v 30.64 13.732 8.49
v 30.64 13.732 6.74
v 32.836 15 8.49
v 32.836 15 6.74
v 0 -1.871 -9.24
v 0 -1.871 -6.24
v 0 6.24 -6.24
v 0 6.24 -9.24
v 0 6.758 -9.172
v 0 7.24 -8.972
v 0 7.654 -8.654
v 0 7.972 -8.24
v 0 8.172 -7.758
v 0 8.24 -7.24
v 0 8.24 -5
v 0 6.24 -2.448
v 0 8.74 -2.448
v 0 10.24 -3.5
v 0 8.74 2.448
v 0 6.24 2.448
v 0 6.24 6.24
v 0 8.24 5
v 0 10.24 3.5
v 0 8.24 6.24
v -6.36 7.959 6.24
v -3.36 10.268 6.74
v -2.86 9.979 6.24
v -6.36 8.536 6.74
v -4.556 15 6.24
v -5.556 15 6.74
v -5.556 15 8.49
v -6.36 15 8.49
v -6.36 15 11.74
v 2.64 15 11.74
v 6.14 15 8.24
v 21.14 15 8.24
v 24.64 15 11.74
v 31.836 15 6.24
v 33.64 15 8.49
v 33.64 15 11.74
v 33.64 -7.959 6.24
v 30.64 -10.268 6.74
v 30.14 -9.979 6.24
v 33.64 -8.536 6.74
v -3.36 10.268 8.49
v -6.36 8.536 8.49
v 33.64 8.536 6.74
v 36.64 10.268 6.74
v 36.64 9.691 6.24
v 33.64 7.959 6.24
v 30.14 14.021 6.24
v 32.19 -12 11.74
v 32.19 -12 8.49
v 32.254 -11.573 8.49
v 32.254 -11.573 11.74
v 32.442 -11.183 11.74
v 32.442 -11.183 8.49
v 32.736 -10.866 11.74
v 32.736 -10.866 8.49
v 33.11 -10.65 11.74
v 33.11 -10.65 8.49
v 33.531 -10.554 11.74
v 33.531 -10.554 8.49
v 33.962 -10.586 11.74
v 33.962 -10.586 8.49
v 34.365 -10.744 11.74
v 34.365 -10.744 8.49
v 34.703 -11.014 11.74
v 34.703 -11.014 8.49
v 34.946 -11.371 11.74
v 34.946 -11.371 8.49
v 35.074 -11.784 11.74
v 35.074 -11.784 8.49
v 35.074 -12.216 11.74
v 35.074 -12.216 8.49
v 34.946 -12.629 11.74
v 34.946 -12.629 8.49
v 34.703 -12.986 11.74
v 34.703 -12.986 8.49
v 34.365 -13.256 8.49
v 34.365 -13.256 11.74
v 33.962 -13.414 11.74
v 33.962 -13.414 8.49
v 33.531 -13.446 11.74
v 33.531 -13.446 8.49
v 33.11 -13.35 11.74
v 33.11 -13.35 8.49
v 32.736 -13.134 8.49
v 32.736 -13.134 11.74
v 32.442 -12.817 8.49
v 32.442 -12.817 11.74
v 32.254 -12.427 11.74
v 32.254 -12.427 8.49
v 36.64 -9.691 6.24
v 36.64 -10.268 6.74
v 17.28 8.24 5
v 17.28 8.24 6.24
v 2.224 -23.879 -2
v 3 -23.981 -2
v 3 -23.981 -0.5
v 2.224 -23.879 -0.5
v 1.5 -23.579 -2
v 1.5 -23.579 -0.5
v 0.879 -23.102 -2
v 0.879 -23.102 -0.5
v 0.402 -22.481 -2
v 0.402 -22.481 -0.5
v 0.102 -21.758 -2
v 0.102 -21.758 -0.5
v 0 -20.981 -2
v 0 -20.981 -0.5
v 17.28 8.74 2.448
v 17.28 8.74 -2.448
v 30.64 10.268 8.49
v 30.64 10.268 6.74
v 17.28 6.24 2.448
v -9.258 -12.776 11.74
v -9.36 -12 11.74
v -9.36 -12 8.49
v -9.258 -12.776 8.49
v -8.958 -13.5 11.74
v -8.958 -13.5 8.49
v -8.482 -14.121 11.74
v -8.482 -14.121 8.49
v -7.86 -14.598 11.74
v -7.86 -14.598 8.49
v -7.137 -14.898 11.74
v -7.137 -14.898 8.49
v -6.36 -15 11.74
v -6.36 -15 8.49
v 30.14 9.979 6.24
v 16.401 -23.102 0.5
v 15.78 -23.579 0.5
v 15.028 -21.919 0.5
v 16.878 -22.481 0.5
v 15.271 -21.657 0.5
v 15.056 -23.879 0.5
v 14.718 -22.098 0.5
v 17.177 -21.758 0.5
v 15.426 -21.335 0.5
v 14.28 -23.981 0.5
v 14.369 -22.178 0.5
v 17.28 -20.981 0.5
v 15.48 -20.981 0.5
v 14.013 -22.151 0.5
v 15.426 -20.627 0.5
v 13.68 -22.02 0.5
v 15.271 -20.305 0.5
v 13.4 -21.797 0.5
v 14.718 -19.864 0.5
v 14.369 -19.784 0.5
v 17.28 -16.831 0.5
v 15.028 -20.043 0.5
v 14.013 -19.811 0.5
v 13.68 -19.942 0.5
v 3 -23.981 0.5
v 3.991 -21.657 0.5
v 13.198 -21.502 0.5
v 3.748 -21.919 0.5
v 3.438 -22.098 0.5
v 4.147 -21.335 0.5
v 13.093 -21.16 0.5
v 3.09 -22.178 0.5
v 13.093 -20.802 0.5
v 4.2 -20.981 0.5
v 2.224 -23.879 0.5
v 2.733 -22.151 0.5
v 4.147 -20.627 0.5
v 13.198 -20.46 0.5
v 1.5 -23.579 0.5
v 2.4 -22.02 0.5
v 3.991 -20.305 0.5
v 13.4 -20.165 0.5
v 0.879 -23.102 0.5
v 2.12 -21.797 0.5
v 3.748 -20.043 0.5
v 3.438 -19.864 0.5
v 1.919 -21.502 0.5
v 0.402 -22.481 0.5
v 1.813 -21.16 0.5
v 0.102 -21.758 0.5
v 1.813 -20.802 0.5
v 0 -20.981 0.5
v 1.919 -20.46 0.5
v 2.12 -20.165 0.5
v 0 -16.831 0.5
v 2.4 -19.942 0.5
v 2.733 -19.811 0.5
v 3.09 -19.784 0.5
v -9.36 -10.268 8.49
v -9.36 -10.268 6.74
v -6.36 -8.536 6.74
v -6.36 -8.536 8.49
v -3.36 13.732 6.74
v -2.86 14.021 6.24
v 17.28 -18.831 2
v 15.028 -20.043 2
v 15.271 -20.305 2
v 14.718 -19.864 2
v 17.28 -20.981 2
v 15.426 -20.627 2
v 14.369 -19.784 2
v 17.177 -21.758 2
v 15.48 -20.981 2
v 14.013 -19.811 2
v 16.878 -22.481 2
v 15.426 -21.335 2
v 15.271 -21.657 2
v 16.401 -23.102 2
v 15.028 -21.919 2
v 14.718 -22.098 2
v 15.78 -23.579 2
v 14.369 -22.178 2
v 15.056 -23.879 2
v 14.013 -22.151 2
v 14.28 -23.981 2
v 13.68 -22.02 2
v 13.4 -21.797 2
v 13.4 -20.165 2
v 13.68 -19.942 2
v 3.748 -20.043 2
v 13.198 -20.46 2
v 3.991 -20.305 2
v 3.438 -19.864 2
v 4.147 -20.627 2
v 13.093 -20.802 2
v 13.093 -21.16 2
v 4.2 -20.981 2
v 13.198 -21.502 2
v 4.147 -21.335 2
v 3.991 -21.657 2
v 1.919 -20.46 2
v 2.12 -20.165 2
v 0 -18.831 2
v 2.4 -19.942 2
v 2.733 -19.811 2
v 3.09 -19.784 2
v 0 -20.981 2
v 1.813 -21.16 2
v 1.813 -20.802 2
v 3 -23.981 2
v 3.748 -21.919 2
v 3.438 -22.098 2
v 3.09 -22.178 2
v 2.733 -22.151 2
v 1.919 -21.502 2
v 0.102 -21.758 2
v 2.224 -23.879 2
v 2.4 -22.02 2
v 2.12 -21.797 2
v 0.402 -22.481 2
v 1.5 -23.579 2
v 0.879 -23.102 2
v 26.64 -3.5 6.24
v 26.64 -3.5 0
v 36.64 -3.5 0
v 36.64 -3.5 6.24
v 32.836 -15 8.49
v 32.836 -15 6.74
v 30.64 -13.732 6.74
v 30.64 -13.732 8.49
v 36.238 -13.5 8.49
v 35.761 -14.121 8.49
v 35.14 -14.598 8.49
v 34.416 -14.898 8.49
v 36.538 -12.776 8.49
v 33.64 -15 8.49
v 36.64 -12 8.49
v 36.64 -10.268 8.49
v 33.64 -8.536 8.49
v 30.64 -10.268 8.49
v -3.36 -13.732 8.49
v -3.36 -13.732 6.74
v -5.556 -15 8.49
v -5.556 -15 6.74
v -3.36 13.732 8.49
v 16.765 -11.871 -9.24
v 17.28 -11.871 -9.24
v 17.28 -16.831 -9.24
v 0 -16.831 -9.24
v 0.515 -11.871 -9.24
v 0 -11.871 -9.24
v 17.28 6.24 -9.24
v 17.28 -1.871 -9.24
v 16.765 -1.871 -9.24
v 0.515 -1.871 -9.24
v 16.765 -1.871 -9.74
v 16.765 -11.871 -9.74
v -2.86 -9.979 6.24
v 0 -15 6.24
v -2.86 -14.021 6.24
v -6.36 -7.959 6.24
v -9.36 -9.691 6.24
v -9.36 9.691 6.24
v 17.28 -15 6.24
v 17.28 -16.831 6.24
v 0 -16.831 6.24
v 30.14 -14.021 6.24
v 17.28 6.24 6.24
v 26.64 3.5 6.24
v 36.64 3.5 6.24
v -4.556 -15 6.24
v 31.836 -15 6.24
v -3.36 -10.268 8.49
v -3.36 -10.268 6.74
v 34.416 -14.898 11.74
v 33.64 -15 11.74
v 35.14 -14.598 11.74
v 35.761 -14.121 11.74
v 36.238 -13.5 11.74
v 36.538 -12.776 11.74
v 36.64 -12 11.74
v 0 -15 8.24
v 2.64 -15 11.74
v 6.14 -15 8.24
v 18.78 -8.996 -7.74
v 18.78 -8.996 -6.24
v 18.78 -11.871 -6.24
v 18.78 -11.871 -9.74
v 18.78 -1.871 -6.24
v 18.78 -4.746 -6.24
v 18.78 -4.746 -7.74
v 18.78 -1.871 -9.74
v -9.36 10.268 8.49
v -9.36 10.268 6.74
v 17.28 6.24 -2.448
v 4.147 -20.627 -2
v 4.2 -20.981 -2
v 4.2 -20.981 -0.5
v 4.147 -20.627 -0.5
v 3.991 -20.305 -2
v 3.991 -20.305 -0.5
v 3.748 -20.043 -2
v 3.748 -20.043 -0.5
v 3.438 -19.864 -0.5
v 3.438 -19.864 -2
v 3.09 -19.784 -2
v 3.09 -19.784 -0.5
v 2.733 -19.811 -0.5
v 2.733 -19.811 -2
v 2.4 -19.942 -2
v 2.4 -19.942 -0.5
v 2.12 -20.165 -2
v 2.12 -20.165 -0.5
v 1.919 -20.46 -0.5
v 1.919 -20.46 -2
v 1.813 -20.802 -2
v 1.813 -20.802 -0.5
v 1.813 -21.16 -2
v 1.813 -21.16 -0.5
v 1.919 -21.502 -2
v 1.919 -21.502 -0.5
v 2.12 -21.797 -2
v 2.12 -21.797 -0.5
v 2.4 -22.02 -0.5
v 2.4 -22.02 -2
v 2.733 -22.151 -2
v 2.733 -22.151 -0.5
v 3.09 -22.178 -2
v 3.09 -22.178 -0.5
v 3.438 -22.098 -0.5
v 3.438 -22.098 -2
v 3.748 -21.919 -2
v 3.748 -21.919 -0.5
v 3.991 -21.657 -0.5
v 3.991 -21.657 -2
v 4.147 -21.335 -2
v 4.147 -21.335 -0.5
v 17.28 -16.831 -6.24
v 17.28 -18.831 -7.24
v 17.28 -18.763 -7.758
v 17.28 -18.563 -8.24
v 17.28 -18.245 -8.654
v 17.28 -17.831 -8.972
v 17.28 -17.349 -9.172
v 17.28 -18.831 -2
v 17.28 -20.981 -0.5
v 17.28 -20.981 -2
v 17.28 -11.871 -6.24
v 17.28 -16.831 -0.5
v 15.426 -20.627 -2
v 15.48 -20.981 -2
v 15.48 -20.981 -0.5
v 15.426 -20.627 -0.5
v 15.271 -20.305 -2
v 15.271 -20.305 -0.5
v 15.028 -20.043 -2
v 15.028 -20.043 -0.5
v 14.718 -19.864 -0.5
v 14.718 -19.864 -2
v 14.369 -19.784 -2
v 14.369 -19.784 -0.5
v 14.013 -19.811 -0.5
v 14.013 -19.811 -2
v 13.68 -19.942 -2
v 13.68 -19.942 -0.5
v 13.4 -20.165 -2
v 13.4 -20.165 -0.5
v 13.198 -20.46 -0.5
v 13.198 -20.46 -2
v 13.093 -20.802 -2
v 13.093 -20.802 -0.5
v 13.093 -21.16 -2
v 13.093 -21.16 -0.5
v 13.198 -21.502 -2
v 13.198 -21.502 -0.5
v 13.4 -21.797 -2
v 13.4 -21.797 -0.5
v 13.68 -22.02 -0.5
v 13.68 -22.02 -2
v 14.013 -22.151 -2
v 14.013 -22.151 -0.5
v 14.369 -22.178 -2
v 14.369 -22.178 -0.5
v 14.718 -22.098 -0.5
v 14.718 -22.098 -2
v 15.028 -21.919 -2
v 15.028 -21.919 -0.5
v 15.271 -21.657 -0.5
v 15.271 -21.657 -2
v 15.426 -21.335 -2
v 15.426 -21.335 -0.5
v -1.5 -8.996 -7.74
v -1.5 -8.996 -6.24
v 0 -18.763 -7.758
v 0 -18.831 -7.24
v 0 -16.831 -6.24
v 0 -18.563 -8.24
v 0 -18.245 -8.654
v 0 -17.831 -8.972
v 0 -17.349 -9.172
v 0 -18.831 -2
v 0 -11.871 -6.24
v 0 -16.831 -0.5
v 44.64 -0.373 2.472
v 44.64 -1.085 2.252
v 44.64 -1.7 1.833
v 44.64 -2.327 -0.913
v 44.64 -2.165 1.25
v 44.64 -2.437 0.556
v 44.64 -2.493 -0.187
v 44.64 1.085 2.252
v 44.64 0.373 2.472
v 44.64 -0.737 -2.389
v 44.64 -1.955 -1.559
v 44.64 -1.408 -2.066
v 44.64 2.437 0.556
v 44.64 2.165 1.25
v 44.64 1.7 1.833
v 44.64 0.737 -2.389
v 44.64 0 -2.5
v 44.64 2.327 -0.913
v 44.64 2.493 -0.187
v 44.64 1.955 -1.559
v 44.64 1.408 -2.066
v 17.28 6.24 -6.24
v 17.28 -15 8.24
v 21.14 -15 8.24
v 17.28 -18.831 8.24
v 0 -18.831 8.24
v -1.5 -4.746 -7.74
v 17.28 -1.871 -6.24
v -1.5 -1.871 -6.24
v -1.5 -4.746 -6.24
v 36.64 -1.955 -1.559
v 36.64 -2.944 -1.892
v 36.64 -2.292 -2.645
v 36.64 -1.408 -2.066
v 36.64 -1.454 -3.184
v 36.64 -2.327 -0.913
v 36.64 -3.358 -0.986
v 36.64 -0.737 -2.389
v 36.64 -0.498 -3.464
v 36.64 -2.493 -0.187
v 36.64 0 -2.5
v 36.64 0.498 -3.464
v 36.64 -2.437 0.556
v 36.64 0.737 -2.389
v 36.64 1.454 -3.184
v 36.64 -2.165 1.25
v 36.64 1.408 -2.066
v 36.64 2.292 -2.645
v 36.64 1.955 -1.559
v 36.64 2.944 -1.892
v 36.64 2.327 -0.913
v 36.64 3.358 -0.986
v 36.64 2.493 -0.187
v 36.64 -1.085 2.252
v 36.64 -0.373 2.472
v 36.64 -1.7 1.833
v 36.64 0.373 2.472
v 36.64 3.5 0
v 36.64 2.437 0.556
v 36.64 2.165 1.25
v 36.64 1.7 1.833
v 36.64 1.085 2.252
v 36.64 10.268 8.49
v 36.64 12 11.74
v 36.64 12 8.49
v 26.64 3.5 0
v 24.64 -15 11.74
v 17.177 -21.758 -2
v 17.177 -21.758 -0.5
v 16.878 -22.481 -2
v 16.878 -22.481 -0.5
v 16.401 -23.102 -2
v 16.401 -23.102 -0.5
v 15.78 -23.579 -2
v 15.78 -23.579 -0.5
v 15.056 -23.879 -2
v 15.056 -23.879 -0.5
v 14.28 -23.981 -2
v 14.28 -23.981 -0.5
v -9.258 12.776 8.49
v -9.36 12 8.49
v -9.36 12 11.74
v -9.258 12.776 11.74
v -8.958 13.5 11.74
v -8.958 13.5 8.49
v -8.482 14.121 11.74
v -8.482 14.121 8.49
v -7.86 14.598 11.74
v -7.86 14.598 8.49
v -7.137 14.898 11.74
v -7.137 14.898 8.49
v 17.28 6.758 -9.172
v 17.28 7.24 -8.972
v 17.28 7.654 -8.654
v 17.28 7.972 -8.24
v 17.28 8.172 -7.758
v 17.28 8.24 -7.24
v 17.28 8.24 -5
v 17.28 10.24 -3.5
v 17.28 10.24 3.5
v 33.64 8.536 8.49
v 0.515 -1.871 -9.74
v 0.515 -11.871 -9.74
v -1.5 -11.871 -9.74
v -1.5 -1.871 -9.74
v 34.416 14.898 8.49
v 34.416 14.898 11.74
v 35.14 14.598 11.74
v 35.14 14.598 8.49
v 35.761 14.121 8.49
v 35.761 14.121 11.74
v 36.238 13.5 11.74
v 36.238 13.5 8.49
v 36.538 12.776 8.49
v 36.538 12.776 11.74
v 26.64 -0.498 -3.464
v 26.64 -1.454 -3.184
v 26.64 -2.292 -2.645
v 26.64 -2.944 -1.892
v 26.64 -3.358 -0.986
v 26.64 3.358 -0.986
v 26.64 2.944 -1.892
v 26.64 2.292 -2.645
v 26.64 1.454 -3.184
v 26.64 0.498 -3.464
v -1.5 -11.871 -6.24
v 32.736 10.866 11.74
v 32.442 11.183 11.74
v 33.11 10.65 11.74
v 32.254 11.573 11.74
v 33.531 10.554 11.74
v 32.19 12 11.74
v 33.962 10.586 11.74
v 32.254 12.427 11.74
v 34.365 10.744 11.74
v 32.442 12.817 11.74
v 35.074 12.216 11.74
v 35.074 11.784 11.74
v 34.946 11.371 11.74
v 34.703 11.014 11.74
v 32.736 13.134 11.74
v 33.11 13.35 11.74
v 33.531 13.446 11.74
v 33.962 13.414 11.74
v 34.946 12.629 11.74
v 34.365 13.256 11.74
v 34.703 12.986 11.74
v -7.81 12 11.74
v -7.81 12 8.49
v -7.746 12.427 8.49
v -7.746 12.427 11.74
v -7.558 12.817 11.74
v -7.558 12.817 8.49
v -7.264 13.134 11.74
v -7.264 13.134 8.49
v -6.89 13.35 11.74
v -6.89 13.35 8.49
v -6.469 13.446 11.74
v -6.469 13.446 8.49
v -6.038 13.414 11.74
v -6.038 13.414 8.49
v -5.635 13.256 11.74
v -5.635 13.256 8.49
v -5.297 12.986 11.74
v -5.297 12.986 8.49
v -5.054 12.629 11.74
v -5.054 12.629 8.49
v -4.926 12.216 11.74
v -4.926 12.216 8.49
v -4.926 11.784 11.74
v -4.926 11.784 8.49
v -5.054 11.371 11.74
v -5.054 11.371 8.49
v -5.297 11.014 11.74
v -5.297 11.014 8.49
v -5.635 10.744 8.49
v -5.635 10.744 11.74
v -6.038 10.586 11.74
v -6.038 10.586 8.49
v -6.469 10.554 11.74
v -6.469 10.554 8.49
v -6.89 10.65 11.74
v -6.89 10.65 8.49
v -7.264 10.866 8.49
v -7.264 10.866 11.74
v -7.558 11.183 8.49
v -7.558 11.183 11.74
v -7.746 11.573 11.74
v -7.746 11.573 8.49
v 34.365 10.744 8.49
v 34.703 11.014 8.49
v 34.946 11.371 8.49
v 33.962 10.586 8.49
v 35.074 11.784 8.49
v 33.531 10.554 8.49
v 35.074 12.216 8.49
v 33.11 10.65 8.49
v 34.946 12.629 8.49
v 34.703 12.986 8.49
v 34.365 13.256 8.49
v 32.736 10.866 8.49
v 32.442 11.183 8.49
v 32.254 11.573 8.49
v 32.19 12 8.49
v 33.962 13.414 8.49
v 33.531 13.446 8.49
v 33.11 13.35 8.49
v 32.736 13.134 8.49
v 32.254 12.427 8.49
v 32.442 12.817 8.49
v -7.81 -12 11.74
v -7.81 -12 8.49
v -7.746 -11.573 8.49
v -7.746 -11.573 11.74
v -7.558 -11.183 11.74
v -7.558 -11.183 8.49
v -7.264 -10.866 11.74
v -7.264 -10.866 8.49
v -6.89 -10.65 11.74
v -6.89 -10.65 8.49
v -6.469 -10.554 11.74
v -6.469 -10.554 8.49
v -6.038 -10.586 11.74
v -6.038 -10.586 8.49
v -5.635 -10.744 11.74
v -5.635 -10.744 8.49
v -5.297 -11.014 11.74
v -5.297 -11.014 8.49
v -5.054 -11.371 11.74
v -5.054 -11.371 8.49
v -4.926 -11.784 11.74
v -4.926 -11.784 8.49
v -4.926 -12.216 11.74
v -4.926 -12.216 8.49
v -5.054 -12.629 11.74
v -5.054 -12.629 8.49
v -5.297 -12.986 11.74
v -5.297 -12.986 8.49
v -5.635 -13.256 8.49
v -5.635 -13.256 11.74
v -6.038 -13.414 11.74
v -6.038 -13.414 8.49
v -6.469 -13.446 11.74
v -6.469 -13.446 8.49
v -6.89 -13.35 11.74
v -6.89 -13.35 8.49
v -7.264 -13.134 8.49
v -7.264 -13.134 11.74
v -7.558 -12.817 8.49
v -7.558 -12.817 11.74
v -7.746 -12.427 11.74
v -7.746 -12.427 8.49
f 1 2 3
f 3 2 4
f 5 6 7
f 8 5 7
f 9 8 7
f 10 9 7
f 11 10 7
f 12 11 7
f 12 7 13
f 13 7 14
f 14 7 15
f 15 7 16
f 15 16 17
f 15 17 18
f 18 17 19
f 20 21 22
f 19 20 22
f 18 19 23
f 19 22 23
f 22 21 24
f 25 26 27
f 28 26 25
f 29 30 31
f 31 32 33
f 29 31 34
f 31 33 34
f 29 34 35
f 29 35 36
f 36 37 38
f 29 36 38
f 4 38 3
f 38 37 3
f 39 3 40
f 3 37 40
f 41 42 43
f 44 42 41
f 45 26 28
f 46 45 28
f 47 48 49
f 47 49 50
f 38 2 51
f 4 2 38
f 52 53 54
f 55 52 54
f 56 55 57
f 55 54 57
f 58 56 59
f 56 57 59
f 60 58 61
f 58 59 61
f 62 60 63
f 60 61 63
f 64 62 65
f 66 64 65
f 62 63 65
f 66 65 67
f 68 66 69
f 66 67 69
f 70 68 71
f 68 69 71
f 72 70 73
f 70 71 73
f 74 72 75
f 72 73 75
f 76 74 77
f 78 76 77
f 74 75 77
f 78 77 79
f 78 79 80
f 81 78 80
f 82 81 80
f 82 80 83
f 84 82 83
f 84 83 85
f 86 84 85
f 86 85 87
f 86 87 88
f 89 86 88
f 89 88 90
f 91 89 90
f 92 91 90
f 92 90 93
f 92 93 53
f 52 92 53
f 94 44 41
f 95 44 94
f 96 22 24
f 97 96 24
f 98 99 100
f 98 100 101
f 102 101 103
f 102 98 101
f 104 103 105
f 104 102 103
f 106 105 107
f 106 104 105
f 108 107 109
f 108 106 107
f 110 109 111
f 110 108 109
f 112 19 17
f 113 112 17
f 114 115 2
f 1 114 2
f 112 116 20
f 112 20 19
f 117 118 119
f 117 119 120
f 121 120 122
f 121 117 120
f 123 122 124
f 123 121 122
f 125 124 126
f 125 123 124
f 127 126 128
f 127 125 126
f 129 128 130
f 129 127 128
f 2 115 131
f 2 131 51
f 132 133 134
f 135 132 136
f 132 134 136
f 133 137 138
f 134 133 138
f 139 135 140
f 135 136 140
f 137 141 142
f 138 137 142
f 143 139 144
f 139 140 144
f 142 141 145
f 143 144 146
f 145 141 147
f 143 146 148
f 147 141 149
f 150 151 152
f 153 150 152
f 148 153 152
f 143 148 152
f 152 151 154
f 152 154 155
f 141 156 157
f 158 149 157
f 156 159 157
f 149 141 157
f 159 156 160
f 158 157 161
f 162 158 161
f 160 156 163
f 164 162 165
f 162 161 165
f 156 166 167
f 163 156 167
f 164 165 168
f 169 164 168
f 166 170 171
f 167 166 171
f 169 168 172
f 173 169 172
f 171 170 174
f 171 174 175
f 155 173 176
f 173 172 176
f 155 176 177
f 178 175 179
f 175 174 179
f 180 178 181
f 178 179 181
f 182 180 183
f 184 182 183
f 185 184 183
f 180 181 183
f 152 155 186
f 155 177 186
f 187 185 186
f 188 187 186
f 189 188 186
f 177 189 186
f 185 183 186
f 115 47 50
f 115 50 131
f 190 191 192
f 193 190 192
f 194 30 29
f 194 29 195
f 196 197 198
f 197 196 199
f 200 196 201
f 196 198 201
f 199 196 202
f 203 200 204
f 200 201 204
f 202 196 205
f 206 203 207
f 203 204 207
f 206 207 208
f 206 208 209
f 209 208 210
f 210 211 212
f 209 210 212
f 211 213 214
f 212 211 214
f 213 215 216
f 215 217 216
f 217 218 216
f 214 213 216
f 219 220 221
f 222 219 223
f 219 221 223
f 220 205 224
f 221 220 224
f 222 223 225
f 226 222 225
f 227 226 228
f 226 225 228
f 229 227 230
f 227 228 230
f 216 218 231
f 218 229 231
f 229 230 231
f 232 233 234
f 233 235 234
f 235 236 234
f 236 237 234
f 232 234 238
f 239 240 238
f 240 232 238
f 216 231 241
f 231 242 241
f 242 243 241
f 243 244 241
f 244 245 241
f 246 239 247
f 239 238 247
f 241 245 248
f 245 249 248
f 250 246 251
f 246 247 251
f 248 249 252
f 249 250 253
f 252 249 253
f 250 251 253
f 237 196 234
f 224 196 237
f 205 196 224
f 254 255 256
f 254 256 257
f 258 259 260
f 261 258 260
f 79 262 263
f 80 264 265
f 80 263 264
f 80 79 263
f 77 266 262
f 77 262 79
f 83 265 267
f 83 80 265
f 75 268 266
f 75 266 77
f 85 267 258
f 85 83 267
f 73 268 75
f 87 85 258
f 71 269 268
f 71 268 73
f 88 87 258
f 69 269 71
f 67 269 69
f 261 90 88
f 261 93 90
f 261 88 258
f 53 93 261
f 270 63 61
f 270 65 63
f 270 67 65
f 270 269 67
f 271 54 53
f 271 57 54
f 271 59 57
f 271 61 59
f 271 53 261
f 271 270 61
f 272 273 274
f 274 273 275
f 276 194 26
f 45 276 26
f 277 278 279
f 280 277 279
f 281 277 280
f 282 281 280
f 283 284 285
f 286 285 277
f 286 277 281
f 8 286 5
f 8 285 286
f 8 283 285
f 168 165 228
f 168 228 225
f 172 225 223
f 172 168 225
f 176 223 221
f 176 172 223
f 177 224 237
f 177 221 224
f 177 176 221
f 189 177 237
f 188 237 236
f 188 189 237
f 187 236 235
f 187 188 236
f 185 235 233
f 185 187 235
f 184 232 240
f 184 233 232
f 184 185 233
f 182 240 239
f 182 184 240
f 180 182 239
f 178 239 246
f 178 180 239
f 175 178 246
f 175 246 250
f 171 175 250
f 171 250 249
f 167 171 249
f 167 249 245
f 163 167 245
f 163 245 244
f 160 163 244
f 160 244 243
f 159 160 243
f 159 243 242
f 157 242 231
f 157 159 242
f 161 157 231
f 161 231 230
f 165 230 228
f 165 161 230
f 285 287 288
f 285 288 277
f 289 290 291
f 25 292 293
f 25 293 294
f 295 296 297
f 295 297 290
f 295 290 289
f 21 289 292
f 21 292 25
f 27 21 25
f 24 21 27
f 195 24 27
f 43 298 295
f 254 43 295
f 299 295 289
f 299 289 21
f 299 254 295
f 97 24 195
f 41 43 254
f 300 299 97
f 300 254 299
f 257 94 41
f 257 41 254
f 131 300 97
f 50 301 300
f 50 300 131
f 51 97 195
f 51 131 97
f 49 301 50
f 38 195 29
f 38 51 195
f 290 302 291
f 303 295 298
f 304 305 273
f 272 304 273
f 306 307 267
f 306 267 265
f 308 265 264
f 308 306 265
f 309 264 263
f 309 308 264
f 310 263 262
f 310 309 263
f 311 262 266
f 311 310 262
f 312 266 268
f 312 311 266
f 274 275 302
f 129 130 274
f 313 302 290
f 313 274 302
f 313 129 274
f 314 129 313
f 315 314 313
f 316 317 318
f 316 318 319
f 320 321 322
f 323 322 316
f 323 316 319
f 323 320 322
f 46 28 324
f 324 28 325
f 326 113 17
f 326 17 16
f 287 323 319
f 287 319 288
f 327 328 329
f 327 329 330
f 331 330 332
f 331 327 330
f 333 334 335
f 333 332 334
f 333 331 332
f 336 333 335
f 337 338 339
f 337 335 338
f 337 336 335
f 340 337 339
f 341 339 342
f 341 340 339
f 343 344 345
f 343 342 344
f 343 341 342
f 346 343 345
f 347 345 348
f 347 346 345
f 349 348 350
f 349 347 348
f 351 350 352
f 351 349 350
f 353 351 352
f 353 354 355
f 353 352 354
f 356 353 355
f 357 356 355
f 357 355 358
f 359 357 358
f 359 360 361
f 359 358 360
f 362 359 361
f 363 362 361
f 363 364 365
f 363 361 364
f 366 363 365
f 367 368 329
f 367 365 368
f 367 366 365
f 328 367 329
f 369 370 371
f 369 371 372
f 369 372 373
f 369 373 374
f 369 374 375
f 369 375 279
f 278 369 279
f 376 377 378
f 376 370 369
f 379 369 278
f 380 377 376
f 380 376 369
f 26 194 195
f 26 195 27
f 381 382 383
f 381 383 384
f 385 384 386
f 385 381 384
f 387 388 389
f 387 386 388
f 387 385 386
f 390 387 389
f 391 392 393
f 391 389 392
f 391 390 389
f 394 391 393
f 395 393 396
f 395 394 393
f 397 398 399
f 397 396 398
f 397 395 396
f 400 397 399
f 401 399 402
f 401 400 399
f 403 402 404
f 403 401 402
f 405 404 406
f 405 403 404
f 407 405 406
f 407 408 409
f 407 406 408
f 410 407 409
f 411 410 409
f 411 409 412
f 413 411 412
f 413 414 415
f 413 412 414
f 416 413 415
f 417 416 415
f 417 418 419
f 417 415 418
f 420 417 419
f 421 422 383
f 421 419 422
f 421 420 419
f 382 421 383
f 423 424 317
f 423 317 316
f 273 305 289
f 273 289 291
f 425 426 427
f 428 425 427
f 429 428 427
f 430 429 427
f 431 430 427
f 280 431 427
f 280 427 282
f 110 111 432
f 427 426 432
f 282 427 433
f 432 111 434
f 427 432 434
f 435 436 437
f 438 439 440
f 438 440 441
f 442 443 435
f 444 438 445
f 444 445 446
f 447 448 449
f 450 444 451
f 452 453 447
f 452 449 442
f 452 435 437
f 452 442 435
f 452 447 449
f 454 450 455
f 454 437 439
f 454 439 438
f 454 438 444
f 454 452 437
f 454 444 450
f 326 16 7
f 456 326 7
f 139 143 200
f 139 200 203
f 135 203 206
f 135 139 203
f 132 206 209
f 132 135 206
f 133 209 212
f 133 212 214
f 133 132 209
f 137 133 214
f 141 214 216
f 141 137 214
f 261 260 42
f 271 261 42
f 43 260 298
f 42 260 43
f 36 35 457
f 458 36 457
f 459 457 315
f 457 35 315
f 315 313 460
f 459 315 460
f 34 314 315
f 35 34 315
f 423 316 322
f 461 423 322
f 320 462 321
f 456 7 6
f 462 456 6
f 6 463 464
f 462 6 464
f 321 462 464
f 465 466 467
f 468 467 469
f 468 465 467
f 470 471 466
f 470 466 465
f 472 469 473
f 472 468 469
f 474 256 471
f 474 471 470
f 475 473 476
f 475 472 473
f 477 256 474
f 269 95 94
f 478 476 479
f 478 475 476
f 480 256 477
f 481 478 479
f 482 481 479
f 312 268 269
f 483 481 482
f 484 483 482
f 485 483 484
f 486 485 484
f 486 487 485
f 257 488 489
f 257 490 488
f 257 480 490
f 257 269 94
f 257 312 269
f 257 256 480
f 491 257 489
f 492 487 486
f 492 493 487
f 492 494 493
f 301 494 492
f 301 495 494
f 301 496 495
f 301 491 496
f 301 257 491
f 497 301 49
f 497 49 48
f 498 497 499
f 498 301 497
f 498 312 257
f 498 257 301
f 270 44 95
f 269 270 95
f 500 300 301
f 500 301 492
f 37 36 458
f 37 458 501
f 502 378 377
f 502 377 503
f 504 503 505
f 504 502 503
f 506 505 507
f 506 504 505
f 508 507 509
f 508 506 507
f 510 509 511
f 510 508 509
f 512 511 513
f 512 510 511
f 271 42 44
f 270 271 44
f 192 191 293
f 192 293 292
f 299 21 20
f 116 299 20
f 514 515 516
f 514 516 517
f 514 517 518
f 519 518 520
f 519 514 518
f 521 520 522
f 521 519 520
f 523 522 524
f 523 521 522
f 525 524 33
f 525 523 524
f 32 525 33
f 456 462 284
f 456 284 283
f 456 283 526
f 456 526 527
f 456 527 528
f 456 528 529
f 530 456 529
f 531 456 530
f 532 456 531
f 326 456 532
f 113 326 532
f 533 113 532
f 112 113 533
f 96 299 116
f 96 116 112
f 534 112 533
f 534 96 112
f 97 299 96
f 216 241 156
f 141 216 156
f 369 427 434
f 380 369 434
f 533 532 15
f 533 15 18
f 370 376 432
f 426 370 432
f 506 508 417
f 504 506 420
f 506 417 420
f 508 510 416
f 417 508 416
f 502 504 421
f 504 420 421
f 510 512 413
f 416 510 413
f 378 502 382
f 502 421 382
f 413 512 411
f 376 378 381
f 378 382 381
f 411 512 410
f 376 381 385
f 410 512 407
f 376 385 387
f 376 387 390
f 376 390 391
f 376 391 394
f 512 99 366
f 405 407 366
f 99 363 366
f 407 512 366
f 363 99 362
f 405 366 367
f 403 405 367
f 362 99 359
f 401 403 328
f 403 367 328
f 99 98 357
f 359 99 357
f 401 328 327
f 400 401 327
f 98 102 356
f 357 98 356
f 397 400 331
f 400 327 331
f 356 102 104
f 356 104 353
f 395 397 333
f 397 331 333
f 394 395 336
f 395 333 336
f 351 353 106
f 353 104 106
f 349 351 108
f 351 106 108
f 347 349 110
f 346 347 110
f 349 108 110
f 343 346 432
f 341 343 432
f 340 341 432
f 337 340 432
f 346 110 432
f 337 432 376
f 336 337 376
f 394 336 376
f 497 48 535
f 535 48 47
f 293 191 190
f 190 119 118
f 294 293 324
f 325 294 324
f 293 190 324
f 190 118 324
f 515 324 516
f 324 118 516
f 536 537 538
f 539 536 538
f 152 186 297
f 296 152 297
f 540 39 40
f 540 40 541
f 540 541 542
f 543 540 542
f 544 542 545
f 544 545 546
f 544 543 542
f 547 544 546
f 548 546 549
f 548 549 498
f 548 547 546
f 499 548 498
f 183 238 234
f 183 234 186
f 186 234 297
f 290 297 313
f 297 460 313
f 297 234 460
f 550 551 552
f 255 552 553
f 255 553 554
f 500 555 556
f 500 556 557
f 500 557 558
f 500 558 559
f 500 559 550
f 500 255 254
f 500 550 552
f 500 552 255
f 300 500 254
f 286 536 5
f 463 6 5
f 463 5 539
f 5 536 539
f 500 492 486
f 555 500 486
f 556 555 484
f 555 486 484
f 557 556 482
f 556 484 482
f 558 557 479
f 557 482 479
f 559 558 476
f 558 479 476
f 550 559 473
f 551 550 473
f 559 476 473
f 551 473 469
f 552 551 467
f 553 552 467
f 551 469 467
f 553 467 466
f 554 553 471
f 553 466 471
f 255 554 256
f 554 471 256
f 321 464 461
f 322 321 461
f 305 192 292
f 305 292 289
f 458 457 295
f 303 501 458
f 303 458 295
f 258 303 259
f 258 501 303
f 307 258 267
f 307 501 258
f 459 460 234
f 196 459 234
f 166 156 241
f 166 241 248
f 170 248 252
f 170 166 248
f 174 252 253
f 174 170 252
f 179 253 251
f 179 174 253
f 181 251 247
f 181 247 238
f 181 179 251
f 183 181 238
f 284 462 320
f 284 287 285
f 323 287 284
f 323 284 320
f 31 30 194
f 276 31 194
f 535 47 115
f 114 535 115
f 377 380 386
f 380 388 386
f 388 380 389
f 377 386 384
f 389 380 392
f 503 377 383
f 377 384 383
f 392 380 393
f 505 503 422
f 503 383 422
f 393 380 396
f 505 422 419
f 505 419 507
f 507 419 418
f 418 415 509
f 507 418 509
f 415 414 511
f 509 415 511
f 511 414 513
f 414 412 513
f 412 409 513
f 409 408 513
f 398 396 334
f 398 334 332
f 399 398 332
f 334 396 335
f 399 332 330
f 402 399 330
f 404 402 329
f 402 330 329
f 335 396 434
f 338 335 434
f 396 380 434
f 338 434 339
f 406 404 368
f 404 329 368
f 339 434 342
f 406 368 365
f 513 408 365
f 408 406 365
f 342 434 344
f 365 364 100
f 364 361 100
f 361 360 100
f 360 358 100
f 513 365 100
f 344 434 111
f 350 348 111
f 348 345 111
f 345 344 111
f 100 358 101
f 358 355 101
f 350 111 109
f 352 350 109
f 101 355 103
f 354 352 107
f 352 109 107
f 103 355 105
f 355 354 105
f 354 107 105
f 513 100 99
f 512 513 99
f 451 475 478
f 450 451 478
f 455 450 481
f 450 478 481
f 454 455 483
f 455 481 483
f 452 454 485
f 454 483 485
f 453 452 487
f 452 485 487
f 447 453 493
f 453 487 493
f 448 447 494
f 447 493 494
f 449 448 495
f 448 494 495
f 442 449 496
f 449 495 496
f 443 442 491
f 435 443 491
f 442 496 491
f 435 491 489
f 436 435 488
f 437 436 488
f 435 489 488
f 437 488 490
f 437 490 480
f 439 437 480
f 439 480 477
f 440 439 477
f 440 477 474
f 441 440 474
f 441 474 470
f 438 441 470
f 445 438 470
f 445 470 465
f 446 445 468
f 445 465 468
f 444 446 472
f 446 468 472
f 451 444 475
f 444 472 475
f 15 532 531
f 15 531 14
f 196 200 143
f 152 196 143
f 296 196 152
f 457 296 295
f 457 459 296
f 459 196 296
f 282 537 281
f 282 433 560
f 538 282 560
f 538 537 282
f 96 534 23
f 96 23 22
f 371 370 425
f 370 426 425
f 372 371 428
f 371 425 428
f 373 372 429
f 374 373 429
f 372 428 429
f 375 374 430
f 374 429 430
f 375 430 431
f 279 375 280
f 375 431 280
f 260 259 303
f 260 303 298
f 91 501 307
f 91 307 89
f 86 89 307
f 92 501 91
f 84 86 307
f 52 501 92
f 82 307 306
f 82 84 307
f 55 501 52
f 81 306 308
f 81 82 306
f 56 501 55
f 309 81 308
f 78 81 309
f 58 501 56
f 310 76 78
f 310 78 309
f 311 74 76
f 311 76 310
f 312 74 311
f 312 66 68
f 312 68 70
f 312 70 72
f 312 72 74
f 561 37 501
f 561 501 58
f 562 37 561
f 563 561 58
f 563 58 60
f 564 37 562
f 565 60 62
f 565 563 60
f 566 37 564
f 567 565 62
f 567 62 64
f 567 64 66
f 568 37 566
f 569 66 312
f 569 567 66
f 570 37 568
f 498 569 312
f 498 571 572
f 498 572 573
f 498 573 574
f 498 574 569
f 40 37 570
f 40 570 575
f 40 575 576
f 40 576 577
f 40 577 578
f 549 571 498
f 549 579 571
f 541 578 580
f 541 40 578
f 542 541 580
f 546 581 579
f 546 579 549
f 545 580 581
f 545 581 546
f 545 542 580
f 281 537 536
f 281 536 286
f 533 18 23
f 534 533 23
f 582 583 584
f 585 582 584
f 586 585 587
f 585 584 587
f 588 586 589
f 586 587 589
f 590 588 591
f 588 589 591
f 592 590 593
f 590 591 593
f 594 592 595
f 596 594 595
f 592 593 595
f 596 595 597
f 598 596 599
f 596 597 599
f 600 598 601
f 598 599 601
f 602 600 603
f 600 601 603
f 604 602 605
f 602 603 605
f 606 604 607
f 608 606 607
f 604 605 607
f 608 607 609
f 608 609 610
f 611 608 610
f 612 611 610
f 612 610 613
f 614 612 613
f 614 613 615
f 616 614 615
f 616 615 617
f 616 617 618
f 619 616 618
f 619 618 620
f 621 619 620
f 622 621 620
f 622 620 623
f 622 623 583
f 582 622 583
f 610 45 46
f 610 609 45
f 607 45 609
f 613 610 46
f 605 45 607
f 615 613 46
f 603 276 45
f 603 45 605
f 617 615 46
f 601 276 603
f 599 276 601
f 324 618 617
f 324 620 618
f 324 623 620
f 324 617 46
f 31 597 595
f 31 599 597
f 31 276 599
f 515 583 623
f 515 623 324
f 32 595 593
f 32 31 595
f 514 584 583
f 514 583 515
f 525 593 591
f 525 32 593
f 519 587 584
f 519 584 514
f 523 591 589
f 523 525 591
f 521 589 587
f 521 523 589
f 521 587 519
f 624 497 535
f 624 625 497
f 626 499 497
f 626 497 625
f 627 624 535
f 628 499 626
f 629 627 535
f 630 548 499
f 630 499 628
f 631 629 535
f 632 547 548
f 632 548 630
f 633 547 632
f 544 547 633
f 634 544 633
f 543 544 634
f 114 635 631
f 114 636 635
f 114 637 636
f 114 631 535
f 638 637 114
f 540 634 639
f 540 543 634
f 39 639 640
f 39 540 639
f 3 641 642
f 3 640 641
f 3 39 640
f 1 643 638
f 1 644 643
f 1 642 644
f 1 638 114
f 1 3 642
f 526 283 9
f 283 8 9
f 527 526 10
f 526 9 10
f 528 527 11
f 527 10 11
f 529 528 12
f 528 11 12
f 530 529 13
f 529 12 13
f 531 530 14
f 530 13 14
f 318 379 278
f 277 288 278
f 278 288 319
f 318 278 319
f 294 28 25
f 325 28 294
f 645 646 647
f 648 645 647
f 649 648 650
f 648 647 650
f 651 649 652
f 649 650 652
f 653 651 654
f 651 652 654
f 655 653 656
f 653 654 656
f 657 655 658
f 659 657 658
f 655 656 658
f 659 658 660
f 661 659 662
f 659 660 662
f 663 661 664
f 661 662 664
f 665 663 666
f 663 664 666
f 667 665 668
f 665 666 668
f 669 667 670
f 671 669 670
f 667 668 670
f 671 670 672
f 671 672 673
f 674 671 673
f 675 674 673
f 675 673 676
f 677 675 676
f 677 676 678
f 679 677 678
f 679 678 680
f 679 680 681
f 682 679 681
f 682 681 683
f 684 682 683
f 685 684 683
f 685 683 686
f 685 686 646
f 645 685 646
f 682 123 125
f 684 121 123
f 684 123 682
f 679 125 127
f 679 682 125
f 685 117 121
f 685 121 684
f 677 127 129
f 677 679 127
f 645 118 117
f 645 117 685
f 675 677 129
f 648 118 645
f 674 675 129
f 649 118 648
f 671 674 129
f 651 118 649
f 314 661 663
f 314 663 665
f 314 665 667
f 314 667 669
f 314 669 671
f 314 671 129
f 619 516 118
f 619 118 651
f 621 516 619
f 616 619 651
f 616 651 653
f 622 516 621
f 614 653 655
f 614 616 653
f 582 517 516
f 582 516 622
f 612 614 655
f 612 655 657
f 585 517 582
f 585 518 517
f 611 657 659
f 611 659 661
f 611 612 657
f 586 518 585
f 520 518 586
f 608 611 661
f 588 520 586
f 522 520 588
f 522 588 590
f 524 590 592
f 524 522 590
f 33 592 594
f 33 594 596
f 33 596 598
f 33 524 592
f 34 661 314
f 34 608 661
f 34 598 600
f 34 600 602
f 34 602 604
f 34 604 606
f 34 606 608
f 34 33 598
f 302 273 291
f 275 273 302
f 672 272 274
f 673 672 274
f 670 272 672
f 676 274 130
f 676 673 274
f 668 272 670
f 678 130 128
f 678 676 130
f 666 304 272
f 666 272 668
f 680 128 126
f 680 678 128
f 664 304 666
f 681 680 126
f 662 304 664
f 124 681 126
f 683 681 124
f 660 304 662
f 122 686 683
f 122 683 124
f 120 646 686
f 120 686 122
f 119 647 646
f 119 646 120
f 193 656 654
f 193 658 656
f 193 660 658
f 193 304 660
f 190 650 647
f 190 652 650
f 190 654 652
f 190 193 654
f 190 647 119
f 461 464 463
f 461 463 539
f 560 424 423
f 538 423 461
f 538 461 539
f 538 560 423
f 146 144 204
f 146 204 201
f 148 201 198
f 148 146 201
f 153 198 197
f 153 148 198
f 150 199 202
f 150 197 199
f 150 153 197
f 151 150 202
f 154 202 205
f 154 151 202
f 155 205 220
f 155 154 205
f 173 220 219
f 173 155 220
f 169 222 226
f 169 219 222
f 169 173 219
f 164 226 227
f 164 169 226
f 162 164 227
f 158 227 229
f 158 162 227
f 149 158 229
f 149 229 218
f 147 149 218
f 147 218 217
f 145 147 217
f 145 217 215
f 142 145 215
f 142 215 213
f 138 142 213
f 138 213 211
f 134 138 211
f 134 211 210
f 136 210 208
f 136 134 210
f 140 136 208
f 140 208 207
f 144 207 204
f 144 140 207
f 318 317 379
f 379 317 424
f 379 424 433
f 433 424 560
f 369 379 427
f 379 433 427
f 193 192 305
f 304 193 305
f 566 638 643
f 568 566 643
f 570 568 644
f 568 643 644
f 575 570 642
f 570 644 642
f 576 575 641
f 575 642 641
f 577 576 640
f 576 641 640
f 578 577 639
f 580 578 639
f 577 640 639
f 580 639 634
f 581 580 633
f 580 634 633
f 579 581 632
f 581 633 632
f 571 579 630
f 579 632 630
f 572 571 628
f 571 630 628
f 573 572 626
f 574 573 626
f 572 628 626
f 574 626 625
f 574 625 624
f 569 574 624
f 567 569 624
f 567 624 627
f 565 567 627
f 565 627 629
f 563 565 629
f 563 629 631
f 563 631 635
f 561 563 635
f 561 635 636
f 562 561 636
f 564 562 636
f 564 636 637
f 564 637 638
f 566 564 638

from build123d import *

# Parameters (mm, degrees)
MICRO_SERVO_MOUNT_BASE_PART_CAMERA_TUR_DEPTH = 17.2796
MICRO_START                                  = -8.24
MICRO_SERVO_MOUNT_BASE_PART_CAMERA_3_O_R     = 1.2
MICRO_SERVO_MOUNT_BASE_PART_CAMERA_3_DEPTH   = 16.48
SKETCH7_W                                    = 46
SKETCH7_H                                    = 30
BOSS_EXTRUDE1_DEPTH                          = 3.5
BOSS_EXTRUDE1_DIRECTION_2_REACH              = 35.842
M2_5_CLEARANCE_HOLE1_D                       = 2.9
FILLET1_R                                    = 3
BOSS_EXTRUDE2_DEPTH                          = 10
SKETCH11_R                                   = 2.5
BOSS_EXTRUDE3_DEPTH                          = 8
SKETCH14_W                                   = 17.2796
SKETCH14_H                                   = 27.0711
BOSS_EXTRUDE5_DEPTH                          = 1
BOSS_EXTRUDE4_DEPTH                          = 5
SKETCH13_W                                   = 1.5
SKETCH13_H                                   = 4.25
CUT_EXTRUDE1_DEPTH                           = 39.791353434
FILLET2_R                                    = 2
CUT_EXTRUDE2_DEPTH                           = 2.25
CUT_EXTRUDE3_DEPTH                           = 61.415771958
CHAMFER1_SIZE                                = 0.5


with BuildPart() as part:
    # Micro Servo Mount Base Part - Camera Tur: read off the stored shape, not the designer's step
    # Micro Servo Mount Base Part - Camera 2 → Micro Servo Mount Base Part - Camera Tur (new body)
    with BuildSketch(Plane.YZ):
        Polygon((-23.9811, 0.5), (-16.8311, 0.5), (-16.8311, 6.24), (6.24, 6.24), (6.24, 2.4478), (8.74, 2.4478), (8.74, -2.4478), (6.24, -2.4478), (6.24, -6.24), (-16.8311, -6.24), (-16.8311, -0.5), (-23.9811, -0.5), (-23.9811, -2), (-18.8311, -2), (-18.8311, -8.24), (8.24, -8.24), (8.24, -5), (10.24, -3.5), (10.24, 3.5), (8.24, 5), (8.24, 8.24), (-18.8311, 8.24), (-18.8311, 2), (-23.9811, 2), align=None)
    extrude(amount=MICRO_SERVO_MOUNT_BASE_PART_CAMERA_TUR_DEPTH)

    # Micro Servo Mount Base Part - Camera 3 o → Micro Servo Mount Base Part - Camera 3 (cut)
    with BuildSketch(Plane.XY.offset(MICRO_START)):
        with BuildLine():
            Line((0, -23.9811), (3, -23.9811))
            ThreePointArc((3, -23.9811), (0.878679656, -23.102420344), (0, -20.9811))
            Line((0, -20.9811), (0, -23.9811))
        make_face()
        with BuildLine():
            ThreePointArc((17.2796, -20.9811), (16.400920344, -23.102420344), (14.2796, -23.9811))
            Line((14.2796, -23.9811), (17.2796, -23.9811))
            Line((17.2796, -23.9811), (17.2796, -20.9811))
        make_face()
        with Locations((3, -20.9811)):
            Circle(MICRO_SERVO_MOUNT_BASE_PART_CAMERA_3_O_R)
        with Locations((14.2796, -20.9811)):
            Circle(MICRO_SERVO_MOUNT_BASE_PART_CAMERA_3_O_R)
    extrude(amount=MICRO_SERVO_MOUNT_BASE_PART_CAMERA_3_DEPTH, mode=Mode.SUBTRACT)

    # Sketch7 → Boss-Extrude1 (add)
    with BuildSketch(Plane.XY.offset(8.24)):
        with Locations((13.6398, 0)):
            Rectangle(SKETCH7_W, SKETCH7_H)
    extrude(amount=BOSS_EXTRUDE1_DEPTH)

    # Boss-Extrude1 direction 2: up to this face of the body (flat: up to its plane)
    boss_extrude1_direction_2_end = Plane(part.part.faces().sort_by_distance((8.6398, -5.29555, 6.24))[0])
    # Sketch7 → Boss-Extrude1 direction 2 (add, up to the picked face)
    with BuildSketch(Plane.XY.offset(8.24), mode=Mode.PRIVATE) as boss_extrude1_direction_2_sk1:
        with Locations((13.6398, 0)):
            Rectangle(SKETCH7_W, SKETCH7_H)
    boss_extrude1_direction_2_tool1 = split(extrude(boss_extrude1_direction_2_sk1.sketch, amount=-BOSS_EXTRUDE1_DIRECTION_2_REACH, mode=Mode.PRIVATE), bisect_by=boss_extrude1_direction_2_end, keep=Keep.BOTH, mode=Mode.PRIVATE)
    add(boss_extrude1_direction_2_tool1.solids().sort_by(Axis((13.6398, 0, 8.24), (0, 0, -1)))[0])

    # M2.5 Clearance Hole1 (through all)
    with Locations(Plane.XY.offset(11.74)):
        with Locations((-6.3602, 12), (33.6398, 12), (33.6398, -12), (-6.3602, -12)):
            Hole(M2_5_CLEARANCE_HOLE1_D / 2)

    # Fillet1
    fillet1_edges = [part.edges().sort_by_distance(p)[0] for p in [
        (36.6398, -15, 8.99),
        (-9.3602, 15, 8.99),
        (-9.3602, -15, 8.99),
        (36.6398, 15, 8.99),
    ]]
    fillet(fillet1_edges, radius=FILLET1_R)

    # Sketch10 → Boss-Extrude2 (add)
    with BuildSketch(Plane(origin=(36.6398, 0, 0), x_dir=(0, 0, -1), z_dir=(1, 0, 0))):
        with BuildLine():
            Line((-6.24, 3.5), (0, 3.5))
            ThreePointArc((0, 3.5), (3.5, 0), (0, -3.5))
            Line((0, -3.5), (-6.24, -3.5))
            Line((-6.24, -3.5), (-6.24, 3.5))
        make_face()
    extrude(amount=-BOSS_EXTRUDE2_DEPTH)

    # Sketch11 → Boss-Extrude3 (add)
    with BuildSketch(Plane(origin=(36.6398, 0, 0), x_dir=(0, 0, -1), z_dir=(1, 0, 0))):
        Circle(SKETCH11_R)
    extrude(amount=BOSS_EXTRUDE3_DEPTH)

    # Sketch14 → Boss-Extrude5 (add)
    with BuildSketch(Plane(origin=(0, 0, -8.24), x_dir=(-1, 0, 0), z_dir=(0, 0, -1))):
        with Locations((-8.6398, -5.29555)):
            Rectangle(SKETCH14_W, SKETCH14_H)
    extrude(amount=BOSS_EXTRUDE5_DEPTH)

    # Sketch12 → Boss-Extrude4 (add, symmetric)
    with BuildSketch(Plane(origin=(0, -6.87055, 0), x_dir=(1, 0, 0), z_dir=(0, 1, 0))):
        Polygon((0, 9.74), (0.5148, 9.74), (0.5148, 9.24), (0, 9.24), (0, 6.24), (-1.5, 6.24), (-1.5, 9.74), align=None)
        Polygon((17.2796, 6.24), (18.7796, 6.24), (18.7796, 9.74), (17.2796, 9.74), (16.7648, 9.74), (16.7648, 9.24), (17.2796, 9.24), align=None)
    extrude(amount=BOSS_EXTRUDE4_DEPTH, both=True)

    # Sketch13 → Cut-Extrude1 (cut, through all)
    with BuildSketch(Plane(origin=(18.7796, 0, 0), x_dir=(0, 0, -1), z_dir=(1, 0, 0))):
        with Locations((6.99, -6.87055)):
            Rectangle(SKETCH13_W, SKETCH13_H)
    extrude(amount=-CUT_EXTRUDE1_DEPTH, mode=Mode.SUBTRACT)

    # Fillet2
    fillet2_edges = [part.edges().sort_by_distance(p)[0] for p in [
        (8.6398, -18.8311, -9.24),
        (8.6398, 8.24, -9.24),
    ]]
    fillet(fillet2_edges, radius=FILLET2_R)

    # Sketch15 → Cut-Extrude2 (cut)
    with BuildSketch(Plane(origin=(0, 0, 6.24), x_dir=(-1, 0, 0), z_dir=(0, 0, -1))):
        Polygon((9.3602, 13.732050808), (6.3602, 15.464101615), (3.3602, 13.732050808), (3.3602, 10.267949192), (6.3602, 8.535898385), (9.3602, 10.267949192), align=None)
        Polygon((9.3602, -10.267949192), (6.3602, -8.535898385), (3.3602, -10.267949192), (3.3602, -13.732050808), (6.3602, -15.464101615), (9.3602, -13.732050808), align=None)
        Polygon((-36.6398, -10.267949192), (-36.6398, -13.732050808), (-33.6398, -15.464101615), (-30.6398, -13.732050808), (-30.6398, -10.267949192), (-33.6398, -8.535898385), align=None)
        Polygon((-36.6398, 13.732050808), (-36.6398, 10.267949192), (-33.6398, 8.535898385), (-30.6398, 10.267949192), (-30.6398, 13.732050808), (-33.6398, 15.464101615), align=None)
    extrude(amount=-CUT_EXTRUDE2_DEPTH, mode=Mode.SUBTRACT)

    # Sketch16 → Cut-Extrude3 (cut, through all)
    with BuildSketch(Plane(origin=(0, 15, 0), x_dir=(1, 0, 0), z_dir=(0, 1, 0))):
        Polygon((2.6398, -11.74), (6.1398, -8.24), (21.1398, -8.24), (24.6398, -11.74), align=None)
    extrude(amount=-CUT_EXTRUDE3_DEPTH, mode=Mode.SUBTRACT)

    # Chamfer1
    chamfer1_edges = [part.edges().sort_by_distance(p)[0] for p in [
        (35.1398, 9.401923789, 6.24),
        (32.1398, 9.401923789, 6.24),
        (30.6398, 12, 6.24),
        (31.737876211, 14.366025404, 6.24),
        (31.737876211, -14.366025404, 6.24),
        (30.6398, -12, 6.24),
        (32.1398, -9.401923789, 6.24),
        (35.1398, -9.401923789, 6.24),
        (-7.8602, -9.401923789, 6.24),
        (-4.8602, -9.401923789, 6.24),
        (-3.3602, -12, 6.24),
        (-4.458276211, -14.366025404, 6.24),
        (-4.458276211, 14.366025404, 6.24),
        (-3.3602, 12, 6.24),
        (-4.8602, 9.401923789, 6.24),
        (-7.8602, 9.401923789, 6.24),
    ]]
    chamfer(chamfer1_edges, length=CHAMFER1_SIZE)


solid = part.part
